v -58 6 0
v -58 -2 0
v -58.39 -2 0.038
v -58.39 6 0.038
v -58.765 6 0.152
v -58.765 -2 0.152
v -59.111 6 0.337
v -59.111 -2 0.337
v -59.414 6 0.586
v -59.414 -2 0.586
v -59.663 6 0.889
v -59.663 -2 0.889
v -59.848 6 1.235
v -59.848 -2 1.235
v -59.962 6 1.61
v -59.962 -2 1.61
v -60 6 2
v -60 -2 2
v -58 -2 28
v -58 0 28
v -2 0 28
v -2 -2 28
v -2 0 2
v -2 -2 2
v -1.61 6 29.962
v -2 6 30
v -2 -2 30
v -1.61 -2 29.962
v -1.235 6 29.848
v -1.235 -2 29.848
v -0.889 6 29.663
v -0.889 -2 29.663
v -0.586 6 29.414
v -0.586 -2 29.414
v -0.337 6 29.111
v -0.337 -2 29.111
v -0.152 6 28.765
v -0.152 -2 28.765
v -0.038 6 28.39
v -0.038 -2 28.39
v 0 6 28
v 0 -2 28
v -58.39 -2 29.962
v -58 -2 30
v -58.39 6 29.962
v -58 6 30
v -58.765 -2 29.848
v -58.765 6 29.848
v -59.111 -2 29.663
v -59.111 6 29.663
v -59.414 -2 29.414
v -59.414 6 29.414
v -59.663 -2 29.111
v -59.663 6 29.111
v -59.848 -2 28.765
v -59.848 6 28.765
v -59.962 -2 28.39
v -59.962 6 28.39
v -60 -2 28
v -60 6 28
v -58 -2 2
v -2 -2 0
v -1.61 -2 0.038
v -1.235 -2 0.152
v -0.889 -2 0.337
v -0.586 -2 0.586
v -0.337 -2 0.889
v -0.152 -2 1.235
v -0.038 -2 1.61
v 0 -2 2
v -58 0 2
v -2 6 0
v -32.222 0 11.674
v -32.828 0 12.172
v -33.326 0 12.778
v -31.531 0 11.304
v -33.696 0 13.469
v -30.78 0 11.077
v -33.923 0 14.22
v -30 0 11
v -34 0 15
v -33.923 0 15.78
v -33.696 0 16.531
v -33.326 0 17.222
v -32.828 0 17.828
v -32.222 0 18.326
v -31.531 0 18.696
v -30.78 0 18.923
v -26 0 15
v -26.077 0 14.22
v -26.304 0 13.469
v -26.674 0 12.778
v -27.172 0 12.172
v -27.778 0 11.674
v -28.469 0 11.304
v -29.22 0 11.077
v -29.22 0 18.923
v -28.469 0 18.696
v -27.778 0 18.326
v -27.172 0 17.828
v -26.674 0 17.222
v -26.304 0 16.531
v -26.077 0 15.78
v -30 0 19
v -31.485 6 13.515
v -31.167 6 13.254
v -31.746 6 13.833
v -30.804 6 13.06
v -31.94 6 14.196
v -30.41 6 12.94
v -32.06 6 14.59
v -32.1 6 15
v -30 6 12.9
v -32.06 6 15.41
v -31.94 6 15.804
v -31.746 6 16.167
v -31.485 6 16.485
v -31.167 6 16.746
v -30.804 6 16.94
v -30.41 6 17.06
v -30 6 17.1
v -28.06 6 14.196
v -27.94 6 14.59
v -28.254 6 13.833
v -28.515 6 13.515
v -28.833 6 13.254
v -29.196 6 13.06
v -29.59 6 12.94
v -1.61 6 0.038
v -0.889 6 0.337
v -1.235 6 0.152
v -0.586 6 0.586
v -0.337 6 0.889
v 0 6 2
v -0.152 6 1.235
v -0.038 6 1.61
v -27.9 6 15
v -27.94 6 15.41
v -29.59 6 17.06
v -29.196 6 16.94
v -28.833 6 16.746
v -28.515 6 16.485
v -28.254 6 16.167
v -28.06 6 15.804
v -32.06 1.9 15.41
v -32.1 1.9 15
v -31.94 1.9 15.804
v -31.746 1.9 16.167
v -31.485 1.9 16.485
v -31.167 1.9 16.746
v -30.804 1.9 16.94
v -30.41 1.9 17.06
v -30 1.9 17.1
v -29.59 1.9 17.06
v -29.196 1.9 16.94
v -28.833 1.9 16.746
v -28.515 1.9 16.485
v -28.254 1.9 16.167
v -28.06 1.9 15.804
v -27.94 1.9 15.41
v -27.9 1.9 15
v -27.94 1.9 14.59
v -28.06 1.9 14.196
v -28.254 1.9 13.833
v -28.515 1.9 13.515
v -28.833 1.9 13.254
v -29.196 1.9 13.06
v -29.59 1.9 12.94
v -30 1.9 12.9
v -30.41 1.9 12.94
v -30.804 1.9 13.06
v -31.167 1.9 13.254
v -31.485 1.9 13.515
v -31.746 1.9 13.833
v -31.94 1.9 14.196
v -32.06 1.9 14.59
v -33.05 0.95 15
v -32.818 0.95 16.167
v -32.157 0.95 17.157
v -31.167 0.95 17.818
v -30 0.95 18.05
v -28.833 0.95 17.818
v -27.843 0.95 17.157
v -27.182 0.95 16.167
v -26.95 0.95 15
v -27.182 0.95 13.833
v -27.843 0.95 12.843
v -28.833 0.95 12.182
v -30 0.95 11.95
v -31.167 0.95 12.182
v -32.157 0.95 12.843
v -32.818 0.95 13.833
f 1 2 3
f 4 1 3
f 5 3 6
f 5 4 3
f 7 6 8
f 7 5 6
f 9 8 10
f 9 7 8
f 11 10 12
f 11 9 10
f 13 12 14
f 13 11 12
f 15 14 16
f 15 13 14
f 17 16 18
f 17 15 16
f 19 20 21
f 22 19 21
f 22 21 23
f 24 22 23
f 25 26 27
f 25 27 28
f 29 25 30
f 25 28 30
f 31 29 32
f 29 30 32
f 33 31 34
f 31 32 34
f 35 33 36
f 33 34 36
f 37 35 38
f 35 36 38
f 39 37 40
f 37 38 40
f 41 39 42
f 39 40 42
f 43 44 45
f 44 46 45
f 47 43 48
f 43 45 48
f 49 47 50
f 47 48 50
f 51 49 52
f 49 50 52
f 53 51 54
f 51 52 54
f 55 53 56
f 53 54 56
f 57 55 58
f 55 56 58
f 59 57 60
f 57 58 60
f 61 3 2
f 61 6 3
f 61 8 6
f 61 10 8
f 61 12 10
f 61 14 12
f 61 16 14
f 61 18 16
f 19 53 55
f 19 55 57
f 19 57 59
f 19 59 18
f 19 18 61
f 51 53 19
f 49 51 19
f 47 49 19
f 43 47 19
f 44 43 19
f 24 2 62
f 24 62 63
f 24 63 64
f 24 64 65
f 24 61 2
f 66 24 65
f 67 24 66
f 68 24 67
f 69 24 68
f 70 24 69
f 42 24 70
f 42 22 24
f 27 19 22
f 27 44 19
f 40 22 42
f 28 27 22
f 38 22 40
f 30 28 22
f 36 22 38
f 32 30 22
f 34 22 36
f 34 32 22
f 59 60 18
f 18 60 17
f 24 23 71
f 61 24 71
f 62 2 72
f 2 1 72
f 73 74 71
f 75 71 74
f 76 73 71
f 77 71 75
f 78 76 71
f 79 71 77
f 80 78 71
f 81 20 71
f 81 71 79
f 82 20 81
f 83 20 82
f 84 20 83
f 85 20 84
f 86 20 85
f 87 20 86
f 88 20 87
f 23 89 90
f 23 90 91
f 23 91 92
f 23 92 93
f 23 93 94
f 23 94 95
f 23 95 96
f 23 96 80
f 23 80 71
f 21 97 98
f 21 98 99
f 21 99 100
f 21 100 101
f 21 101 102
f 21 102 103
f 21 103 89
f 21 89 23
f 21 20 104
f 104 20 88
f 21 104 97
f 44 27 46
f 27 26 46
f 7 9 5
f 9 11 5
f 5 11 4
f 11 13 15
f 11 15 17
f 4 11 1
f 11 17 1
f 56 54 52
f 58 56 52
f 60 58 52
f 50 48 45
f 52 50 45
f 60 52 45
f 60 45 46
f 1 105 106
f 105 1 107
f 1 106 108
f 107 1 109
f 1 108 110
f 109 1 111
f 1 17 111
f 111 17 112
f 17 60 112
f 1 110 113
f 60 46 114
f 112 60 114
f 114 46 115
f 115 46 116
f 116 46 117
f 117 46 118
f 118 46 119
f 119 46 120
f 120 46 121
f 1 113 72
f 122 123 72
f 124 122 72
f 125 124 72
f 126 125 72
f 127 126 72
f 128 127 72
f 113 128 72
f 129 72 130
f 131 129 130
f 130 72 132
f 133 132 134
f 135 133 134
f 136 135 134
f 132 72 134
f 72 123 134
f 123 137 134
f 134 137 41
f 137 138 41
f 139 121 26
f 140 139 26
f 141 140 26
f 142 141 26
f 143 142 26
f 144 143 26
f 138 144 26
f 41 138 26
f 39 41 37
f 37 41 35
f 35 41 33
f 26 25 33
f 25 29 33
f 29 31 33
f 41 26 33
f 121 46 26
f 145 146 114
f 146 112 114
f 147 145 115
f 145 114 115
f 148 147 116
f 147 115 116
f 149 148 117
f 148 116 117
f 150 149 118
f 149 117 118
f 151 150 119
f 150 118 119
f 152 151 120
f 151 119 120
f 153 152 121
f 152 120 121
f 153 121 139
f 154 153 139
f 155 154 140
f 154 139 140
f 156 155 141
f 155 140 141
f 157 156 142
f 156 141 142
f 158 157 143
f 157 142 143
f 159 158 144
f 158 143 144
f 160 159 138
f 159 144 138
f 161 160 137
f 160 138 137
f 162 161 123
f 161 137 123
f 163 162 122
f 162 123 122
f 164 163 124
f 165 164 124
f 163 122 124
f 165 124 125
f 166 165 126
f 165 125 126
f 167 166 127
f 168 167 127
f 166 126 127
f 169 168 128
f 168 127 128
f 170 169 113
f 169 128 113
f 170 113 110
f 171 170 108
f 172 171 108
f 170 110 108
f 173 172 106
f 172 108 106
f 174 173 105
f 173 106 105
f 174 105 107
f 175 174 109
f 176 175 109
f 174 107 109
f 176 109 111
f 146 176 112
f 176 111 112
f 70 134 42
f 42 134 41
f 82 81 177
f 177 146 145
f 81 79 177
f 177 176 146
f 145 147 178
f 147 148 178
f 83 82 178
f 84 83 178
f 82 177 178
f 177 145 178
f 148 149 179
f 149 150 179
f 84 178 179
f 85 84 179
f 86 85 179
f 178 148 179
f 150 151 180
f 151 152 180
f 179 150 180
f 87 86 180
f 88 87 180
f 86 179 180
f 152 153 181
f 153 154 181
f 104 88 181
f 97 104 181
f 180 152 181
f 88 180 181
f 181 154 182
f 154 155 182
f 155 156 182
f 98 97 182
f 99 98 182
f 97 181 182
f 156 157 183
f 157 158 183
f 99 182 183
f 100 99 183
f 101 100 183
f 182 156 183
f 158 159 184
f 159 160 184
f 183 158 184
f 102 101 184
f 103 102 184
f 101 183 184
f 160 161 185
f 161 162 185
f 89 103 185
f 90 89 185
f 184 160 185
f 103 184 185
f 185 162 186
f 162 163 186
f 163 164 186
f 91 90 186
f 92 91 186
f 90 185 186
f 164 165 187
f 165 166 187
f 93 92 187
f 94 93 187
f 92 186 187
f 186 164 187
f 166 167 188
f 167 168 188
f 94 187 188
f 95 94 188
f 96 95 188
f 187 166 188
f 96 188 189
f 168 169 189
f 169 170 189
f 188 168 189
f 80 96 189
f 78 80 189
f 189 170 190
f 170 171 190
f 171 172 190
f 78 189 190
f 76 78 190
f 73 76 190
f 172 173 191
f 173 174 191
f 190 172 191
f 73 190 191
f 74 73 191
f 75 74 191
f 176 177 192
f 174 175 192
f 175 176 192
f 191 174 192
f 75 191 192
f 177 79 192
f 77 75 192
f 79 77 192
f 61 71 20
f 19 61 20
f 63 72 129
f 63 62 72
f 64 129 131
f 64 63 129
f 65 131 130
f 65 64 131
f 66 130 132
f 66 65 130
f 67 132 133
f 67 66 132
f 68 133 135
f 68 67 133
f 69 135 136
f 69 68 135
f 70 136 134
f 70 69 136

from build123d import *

# Parameters (mm, degrees)
F1_DEPTH       = 6
F2_DEPTH       = 2
F3_D           = 4.2
F3_DEPTH       = 15
F3_CSINK_D     = 8
F3_CSINK_ANGLE = 90
F4_R           = 2


with BuildPart() as f1:
    # F0 (on Front) → F1 (new body)
    with BuildSketch(Plane.XZ):
        Polygon((-60, 0), (0, 0), (0, 30), (-60, 30), (-60, 15), align=None)
        Polygon((-58, 2), (-58, 15), (-58, 28), (-2, 28), (-2, 2), align=None, mode=Mode.SUBTRACT)
        Polygon((-58, 28), (-58, 15), (-58, 2), (-2, 2), (-2, 28), align=None)
    extrude(amount=-F1_DEPTH)

    # F0 (on Front) → F2 (join)
    with BuildSketch(Plane.XZ):
        Polygon((-60, 0), (0, 0), (0, 30), (-60, 30), (-60, 15), align=None)
        Polygon((-58, 2), (-58, 15), (-58, 28), (-2, 28), (-2, 2), align=None, mode=Mode.SUBTRACT)
    extrude(amount=F2_DEPTH)

    # F3
    with Locations(Plane.XZ):
        with Locations((-30, 15)):
            CounterSinkHole(F3_D / 2, F3_CSINK_D / 2, depth=F3_DEPTH, counter_sink_angle=F3_CSINK_ANGLE)

    # F4
    f4_edges = [f1.edges().sort_by_distance(p)[0] for p in [
        (-60, 2, 30),
        (0, 2, 30),
        (0, 2, 0),
        (-60, 2, 0),
    ]]
    fillet(f4_edges, radius=F4_R)


solid = f1.part
